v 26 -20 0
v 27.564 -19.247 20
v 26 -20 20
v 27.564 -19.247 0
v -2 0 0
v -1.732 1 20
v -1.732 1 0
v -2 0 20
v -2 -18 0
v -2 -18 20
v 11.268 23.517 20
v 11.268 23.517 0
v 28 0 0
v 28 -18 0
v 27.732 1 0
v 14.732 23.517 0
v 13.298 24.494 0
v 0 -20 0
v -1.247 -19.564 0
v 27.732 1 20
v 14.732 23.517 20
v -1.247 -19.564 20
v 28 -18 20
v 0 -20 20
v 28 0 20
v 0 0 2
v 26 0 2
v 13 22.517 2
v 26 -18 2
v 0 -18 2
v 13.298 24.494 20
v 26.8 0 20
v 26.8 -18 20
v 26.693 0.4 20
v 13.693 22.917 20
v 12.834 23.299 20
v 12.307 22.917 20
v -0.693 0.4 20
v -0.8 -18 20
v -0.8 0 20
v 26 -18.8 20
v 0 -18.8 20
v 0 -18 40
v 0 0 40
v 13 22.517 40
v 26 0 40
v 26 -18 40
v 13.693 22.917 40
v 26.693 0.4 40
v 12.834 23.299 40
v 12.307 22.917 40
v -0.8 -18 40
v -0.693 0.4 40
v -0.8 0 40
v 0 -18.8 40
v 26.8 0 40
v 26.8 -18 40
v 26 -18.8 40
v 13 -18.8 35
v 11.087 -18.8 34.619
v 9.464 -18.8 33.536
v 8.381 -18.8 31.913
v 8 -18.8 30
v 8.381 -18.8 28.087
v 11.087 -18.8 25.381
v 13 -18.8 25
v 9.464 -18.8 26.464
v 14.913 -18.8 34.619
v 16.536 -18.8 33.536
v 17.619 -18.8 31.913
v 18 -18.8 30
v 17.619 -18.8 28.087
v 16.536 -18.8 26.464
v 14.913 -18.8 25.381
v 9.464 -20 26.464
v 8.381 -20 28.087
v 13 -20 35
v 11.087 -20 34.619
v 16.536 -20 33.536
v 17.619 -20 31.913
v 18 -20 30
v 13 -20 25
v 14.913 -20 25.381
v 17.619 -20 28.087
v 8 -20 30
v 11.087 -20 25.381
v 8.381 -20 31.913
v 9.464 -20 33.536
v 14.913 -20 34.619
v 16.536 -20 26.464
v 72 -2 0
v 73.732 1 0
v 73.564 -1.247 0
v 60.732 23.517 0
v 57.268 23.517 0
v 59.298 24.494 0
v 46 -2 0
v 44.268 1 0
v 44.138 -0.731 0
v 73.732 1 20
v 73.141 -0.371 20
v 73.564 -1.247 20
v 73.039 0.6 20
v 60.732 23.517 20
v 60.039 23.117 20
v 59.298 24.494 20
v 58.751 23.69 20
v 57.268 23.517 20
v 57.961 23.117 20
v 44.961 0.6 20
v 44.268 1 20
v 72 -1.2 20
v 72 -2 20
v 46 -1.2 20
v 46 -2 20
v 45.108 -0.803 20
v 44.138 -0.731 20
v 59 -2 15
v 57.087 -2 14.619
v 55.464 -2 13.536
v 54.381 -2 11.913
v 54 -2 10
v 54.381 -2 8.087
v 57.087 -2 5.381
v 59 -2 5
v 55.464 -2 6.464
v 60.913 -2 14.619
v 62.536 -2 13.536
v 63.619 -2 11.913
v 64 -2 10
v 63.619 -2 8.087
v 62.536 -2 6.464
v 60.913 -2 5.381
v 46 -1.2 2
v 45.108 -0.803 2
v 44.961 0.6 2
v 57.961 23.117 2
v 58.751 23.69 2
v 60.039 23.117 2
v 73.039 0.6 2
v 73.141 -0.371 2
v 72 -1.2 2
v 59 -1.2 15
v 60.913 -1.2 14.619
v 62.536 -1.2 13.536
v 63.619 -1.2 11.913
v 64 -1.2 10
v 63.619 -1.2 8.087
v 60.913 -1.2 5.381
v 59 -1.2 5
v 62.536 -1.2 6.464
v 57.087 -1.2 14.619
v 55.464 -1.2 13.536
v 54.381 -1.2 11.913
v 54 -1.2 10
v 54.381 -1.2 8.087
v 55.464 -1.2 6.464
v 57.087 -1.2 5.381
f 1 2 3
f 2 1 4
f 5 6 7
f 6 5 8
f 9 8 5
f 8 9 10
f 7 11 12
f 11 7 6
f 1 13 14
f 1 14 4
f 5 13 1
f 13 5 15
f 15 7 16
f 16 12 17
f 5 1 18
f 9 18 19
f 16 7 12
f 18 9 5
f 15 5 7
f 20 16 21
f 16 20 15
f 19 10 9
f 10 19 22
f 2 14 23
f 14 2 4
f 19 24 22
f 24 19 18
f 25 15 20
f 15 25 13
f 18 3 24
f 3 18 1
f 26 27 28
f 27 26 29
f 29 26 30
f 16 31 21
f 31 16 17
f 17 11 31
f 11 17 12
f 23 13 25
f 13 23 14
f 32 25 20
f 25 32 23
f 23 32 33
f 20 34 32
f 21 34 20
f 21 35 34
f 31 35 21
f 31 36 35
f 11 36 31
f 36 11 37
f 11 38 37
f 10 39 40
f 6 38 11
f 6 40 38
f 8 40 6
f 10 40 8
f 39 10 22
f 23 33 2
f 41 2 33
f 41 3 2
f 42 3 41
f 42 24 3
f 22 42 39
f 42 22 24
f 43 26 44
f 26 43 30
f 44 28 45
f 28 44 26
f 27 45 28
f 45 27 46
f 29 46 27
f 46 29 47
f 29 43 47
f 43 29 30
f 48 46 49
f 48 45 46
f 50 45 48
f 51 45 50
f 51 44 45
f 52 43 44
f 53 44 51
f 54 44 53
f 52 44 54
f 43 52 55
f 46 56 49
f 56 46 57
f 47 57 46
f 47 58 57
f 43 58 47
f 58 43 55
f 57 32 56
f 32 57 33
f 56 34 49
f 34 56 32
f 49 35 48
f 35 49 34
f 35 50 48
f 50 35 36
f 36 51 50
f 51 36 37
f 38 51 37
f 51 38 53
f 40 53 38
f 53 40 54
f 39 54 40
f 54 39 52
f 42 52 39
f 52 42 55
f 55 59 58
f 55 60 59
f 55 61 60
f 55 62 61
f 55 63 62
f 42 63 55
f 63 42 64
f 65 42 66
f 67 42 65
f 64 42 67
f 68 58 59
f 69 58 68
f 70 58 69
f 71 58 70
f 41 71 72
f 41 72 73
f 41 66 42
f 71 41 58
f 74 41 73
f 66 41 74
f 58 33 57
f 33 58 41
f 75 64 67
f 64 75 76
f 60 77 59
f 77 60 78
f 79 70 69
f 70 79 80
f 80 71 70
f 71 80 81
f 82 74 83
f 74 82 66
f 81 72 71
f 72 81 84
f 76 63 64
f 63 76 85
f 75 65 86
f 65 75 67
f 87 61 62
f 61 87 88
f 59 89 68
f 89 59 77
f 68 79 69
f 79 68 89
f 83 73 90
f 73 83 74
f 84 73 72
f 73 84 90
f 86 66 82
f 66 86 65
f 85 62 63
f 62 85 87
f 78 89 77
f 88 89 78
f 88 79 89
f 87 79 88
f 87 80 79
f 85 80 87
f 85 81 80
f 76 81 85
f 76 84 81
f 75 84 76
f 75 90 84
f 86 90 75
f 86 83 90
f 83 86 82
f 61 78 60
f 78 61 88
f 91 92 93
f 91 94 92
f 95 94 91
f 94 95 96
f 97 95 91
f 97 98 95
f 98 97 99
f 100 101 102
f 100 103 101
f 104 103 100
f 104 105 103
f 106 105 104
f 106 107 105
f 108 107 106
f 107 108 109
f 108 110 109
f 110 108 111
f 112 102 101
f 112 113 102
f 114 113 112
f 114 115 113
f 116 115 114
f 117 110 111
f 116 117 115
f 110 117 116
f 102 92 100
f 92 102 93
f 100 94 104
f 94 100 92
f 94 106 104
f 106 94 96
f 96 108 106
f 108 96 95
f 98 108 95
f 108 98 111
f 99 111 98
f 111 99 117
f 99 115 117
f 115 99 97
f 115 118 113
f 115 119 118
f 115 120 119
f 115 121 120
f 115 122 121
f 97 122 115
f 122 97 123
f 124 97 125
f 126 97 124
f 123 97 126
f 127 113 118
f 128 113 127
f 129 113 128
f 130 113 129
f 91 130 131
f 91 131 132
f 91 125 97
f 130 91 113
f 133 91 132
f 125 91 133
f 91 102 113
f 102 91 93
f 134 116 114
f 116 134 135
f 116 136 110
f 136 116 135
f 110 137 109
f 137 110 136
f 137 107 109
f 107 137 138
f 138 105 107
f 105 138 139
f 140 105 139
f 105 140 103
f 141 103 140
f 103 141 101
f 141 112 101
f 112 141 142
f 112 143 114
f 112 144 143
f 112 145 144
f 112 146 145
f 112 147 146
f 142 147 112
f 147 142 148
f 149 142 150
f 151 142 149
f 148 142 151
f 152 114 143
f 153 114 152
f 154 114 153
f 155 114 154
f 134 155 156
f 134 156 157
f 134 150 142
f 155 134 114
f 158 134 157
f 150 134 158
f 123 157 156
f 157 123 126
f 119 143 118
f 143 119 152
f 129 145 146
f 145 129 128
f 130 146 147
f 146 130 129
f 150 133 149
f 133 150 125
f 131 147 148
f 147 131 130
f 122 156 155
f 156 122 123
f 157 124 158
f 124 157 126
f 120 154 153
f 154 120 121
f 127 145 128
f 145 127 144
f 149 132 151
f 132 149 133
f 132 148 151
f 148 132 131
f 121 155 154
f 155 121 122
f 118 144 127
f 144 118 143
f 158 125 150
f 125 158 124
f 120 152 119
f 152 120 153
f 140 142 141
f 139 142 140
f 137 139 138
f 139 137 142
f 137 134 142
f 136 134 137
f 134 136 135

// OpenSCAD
module container_shape(width, box_width, box_depth) {
    polygon([[0,0], [width,0], [width/2,sin(60) * width]]);
    center_align_offset =  (width-box_width)/2;
    polygon([
        [center_align_offset,0],
        [width-center_align_offset,0],
        [width-center_align_offset,-box_depth],
        [center_align_offset,-box_depth]
    ]);
}

module triangle_container(width, height, box_width, box_depth, wall_thickness=2) {
	linear_extrude(wall_thickness) {
        offset(wall_thickness) {
            container_shape(width, box_width, box_depth);
        }
	}

	linear_extrude(height) {
		difference() {
			offset(wall_thickness) {
				container_shape(width, box_width, box_depth);
			}
			container_shape(width, box_width, box_depth);
        }
			
    }
}

module triangle_container_case(width, height, box_width=0, box_depth=0, box_height=0, wall_thickness=2, overlap = 20) {
	
	triangle_container(width, height-(overlap/2), box_width, box_depth, wall_thickness);
    linear_extrude(height-box_height) {
        center_align_offset =  (width-box_width)/2;
        polygon([
            [center_align_offset,0],
            [width-center_align_offset,0],
            [width-center_align_offset,-box_depth],
            [center_align_offset,-box_depth]
        ]);
    }

	translate([0,0,height-(overlap/2)]) {
		linear_extrude(overlap) {
			difference() {
				offset(wall_thickness/2 -.2) {
					container_shape(width, box_width, box_depth);
				}
				container_shape(width, box_width, box_depth);
				
			}
		}
        translate([width/2,-box_depth,overlap/2]) {
            rotate([90,0,0]) linear_extrude(wall_thickness) circle(5);
        }
	}
}

module triangle_container_lid(width, height=0, box_width=0, box_depth=0, wall_thickness=2, overlap = 20) {

	triangle_container(width, lid_height, box_width, box_depth, wall_thickness);
	translate([0,0,lid_height]) {
        difference() {
            linear_extrude(overlap) {
                difference() {
                    offset(wall_thickness) {
                        container_shape(width, box_width, box_depth);
                    }
                    offset(wall_thickness/2 + .2)
                    container_shape(width, box_width, box_depth);
                }
            }
            translate([width/2,-box_depth,overlap/2]) {
                rotate([90,0,0]) linear_extrude(wall_thickness) circle(5);
            }
        }
	}
}




width = 26;
height = 30;
box_width = 26;
box_depth = 18;
box_height = 30;
lid_height = 0;

// Case
triangle_container_case(width, height - lid_height, box_width, box_depth, 
box_height - lid_height, 2, 20);

//Lid
translate([width + 20, 0, 0])
triangle_container_lid(width, lid_height);
